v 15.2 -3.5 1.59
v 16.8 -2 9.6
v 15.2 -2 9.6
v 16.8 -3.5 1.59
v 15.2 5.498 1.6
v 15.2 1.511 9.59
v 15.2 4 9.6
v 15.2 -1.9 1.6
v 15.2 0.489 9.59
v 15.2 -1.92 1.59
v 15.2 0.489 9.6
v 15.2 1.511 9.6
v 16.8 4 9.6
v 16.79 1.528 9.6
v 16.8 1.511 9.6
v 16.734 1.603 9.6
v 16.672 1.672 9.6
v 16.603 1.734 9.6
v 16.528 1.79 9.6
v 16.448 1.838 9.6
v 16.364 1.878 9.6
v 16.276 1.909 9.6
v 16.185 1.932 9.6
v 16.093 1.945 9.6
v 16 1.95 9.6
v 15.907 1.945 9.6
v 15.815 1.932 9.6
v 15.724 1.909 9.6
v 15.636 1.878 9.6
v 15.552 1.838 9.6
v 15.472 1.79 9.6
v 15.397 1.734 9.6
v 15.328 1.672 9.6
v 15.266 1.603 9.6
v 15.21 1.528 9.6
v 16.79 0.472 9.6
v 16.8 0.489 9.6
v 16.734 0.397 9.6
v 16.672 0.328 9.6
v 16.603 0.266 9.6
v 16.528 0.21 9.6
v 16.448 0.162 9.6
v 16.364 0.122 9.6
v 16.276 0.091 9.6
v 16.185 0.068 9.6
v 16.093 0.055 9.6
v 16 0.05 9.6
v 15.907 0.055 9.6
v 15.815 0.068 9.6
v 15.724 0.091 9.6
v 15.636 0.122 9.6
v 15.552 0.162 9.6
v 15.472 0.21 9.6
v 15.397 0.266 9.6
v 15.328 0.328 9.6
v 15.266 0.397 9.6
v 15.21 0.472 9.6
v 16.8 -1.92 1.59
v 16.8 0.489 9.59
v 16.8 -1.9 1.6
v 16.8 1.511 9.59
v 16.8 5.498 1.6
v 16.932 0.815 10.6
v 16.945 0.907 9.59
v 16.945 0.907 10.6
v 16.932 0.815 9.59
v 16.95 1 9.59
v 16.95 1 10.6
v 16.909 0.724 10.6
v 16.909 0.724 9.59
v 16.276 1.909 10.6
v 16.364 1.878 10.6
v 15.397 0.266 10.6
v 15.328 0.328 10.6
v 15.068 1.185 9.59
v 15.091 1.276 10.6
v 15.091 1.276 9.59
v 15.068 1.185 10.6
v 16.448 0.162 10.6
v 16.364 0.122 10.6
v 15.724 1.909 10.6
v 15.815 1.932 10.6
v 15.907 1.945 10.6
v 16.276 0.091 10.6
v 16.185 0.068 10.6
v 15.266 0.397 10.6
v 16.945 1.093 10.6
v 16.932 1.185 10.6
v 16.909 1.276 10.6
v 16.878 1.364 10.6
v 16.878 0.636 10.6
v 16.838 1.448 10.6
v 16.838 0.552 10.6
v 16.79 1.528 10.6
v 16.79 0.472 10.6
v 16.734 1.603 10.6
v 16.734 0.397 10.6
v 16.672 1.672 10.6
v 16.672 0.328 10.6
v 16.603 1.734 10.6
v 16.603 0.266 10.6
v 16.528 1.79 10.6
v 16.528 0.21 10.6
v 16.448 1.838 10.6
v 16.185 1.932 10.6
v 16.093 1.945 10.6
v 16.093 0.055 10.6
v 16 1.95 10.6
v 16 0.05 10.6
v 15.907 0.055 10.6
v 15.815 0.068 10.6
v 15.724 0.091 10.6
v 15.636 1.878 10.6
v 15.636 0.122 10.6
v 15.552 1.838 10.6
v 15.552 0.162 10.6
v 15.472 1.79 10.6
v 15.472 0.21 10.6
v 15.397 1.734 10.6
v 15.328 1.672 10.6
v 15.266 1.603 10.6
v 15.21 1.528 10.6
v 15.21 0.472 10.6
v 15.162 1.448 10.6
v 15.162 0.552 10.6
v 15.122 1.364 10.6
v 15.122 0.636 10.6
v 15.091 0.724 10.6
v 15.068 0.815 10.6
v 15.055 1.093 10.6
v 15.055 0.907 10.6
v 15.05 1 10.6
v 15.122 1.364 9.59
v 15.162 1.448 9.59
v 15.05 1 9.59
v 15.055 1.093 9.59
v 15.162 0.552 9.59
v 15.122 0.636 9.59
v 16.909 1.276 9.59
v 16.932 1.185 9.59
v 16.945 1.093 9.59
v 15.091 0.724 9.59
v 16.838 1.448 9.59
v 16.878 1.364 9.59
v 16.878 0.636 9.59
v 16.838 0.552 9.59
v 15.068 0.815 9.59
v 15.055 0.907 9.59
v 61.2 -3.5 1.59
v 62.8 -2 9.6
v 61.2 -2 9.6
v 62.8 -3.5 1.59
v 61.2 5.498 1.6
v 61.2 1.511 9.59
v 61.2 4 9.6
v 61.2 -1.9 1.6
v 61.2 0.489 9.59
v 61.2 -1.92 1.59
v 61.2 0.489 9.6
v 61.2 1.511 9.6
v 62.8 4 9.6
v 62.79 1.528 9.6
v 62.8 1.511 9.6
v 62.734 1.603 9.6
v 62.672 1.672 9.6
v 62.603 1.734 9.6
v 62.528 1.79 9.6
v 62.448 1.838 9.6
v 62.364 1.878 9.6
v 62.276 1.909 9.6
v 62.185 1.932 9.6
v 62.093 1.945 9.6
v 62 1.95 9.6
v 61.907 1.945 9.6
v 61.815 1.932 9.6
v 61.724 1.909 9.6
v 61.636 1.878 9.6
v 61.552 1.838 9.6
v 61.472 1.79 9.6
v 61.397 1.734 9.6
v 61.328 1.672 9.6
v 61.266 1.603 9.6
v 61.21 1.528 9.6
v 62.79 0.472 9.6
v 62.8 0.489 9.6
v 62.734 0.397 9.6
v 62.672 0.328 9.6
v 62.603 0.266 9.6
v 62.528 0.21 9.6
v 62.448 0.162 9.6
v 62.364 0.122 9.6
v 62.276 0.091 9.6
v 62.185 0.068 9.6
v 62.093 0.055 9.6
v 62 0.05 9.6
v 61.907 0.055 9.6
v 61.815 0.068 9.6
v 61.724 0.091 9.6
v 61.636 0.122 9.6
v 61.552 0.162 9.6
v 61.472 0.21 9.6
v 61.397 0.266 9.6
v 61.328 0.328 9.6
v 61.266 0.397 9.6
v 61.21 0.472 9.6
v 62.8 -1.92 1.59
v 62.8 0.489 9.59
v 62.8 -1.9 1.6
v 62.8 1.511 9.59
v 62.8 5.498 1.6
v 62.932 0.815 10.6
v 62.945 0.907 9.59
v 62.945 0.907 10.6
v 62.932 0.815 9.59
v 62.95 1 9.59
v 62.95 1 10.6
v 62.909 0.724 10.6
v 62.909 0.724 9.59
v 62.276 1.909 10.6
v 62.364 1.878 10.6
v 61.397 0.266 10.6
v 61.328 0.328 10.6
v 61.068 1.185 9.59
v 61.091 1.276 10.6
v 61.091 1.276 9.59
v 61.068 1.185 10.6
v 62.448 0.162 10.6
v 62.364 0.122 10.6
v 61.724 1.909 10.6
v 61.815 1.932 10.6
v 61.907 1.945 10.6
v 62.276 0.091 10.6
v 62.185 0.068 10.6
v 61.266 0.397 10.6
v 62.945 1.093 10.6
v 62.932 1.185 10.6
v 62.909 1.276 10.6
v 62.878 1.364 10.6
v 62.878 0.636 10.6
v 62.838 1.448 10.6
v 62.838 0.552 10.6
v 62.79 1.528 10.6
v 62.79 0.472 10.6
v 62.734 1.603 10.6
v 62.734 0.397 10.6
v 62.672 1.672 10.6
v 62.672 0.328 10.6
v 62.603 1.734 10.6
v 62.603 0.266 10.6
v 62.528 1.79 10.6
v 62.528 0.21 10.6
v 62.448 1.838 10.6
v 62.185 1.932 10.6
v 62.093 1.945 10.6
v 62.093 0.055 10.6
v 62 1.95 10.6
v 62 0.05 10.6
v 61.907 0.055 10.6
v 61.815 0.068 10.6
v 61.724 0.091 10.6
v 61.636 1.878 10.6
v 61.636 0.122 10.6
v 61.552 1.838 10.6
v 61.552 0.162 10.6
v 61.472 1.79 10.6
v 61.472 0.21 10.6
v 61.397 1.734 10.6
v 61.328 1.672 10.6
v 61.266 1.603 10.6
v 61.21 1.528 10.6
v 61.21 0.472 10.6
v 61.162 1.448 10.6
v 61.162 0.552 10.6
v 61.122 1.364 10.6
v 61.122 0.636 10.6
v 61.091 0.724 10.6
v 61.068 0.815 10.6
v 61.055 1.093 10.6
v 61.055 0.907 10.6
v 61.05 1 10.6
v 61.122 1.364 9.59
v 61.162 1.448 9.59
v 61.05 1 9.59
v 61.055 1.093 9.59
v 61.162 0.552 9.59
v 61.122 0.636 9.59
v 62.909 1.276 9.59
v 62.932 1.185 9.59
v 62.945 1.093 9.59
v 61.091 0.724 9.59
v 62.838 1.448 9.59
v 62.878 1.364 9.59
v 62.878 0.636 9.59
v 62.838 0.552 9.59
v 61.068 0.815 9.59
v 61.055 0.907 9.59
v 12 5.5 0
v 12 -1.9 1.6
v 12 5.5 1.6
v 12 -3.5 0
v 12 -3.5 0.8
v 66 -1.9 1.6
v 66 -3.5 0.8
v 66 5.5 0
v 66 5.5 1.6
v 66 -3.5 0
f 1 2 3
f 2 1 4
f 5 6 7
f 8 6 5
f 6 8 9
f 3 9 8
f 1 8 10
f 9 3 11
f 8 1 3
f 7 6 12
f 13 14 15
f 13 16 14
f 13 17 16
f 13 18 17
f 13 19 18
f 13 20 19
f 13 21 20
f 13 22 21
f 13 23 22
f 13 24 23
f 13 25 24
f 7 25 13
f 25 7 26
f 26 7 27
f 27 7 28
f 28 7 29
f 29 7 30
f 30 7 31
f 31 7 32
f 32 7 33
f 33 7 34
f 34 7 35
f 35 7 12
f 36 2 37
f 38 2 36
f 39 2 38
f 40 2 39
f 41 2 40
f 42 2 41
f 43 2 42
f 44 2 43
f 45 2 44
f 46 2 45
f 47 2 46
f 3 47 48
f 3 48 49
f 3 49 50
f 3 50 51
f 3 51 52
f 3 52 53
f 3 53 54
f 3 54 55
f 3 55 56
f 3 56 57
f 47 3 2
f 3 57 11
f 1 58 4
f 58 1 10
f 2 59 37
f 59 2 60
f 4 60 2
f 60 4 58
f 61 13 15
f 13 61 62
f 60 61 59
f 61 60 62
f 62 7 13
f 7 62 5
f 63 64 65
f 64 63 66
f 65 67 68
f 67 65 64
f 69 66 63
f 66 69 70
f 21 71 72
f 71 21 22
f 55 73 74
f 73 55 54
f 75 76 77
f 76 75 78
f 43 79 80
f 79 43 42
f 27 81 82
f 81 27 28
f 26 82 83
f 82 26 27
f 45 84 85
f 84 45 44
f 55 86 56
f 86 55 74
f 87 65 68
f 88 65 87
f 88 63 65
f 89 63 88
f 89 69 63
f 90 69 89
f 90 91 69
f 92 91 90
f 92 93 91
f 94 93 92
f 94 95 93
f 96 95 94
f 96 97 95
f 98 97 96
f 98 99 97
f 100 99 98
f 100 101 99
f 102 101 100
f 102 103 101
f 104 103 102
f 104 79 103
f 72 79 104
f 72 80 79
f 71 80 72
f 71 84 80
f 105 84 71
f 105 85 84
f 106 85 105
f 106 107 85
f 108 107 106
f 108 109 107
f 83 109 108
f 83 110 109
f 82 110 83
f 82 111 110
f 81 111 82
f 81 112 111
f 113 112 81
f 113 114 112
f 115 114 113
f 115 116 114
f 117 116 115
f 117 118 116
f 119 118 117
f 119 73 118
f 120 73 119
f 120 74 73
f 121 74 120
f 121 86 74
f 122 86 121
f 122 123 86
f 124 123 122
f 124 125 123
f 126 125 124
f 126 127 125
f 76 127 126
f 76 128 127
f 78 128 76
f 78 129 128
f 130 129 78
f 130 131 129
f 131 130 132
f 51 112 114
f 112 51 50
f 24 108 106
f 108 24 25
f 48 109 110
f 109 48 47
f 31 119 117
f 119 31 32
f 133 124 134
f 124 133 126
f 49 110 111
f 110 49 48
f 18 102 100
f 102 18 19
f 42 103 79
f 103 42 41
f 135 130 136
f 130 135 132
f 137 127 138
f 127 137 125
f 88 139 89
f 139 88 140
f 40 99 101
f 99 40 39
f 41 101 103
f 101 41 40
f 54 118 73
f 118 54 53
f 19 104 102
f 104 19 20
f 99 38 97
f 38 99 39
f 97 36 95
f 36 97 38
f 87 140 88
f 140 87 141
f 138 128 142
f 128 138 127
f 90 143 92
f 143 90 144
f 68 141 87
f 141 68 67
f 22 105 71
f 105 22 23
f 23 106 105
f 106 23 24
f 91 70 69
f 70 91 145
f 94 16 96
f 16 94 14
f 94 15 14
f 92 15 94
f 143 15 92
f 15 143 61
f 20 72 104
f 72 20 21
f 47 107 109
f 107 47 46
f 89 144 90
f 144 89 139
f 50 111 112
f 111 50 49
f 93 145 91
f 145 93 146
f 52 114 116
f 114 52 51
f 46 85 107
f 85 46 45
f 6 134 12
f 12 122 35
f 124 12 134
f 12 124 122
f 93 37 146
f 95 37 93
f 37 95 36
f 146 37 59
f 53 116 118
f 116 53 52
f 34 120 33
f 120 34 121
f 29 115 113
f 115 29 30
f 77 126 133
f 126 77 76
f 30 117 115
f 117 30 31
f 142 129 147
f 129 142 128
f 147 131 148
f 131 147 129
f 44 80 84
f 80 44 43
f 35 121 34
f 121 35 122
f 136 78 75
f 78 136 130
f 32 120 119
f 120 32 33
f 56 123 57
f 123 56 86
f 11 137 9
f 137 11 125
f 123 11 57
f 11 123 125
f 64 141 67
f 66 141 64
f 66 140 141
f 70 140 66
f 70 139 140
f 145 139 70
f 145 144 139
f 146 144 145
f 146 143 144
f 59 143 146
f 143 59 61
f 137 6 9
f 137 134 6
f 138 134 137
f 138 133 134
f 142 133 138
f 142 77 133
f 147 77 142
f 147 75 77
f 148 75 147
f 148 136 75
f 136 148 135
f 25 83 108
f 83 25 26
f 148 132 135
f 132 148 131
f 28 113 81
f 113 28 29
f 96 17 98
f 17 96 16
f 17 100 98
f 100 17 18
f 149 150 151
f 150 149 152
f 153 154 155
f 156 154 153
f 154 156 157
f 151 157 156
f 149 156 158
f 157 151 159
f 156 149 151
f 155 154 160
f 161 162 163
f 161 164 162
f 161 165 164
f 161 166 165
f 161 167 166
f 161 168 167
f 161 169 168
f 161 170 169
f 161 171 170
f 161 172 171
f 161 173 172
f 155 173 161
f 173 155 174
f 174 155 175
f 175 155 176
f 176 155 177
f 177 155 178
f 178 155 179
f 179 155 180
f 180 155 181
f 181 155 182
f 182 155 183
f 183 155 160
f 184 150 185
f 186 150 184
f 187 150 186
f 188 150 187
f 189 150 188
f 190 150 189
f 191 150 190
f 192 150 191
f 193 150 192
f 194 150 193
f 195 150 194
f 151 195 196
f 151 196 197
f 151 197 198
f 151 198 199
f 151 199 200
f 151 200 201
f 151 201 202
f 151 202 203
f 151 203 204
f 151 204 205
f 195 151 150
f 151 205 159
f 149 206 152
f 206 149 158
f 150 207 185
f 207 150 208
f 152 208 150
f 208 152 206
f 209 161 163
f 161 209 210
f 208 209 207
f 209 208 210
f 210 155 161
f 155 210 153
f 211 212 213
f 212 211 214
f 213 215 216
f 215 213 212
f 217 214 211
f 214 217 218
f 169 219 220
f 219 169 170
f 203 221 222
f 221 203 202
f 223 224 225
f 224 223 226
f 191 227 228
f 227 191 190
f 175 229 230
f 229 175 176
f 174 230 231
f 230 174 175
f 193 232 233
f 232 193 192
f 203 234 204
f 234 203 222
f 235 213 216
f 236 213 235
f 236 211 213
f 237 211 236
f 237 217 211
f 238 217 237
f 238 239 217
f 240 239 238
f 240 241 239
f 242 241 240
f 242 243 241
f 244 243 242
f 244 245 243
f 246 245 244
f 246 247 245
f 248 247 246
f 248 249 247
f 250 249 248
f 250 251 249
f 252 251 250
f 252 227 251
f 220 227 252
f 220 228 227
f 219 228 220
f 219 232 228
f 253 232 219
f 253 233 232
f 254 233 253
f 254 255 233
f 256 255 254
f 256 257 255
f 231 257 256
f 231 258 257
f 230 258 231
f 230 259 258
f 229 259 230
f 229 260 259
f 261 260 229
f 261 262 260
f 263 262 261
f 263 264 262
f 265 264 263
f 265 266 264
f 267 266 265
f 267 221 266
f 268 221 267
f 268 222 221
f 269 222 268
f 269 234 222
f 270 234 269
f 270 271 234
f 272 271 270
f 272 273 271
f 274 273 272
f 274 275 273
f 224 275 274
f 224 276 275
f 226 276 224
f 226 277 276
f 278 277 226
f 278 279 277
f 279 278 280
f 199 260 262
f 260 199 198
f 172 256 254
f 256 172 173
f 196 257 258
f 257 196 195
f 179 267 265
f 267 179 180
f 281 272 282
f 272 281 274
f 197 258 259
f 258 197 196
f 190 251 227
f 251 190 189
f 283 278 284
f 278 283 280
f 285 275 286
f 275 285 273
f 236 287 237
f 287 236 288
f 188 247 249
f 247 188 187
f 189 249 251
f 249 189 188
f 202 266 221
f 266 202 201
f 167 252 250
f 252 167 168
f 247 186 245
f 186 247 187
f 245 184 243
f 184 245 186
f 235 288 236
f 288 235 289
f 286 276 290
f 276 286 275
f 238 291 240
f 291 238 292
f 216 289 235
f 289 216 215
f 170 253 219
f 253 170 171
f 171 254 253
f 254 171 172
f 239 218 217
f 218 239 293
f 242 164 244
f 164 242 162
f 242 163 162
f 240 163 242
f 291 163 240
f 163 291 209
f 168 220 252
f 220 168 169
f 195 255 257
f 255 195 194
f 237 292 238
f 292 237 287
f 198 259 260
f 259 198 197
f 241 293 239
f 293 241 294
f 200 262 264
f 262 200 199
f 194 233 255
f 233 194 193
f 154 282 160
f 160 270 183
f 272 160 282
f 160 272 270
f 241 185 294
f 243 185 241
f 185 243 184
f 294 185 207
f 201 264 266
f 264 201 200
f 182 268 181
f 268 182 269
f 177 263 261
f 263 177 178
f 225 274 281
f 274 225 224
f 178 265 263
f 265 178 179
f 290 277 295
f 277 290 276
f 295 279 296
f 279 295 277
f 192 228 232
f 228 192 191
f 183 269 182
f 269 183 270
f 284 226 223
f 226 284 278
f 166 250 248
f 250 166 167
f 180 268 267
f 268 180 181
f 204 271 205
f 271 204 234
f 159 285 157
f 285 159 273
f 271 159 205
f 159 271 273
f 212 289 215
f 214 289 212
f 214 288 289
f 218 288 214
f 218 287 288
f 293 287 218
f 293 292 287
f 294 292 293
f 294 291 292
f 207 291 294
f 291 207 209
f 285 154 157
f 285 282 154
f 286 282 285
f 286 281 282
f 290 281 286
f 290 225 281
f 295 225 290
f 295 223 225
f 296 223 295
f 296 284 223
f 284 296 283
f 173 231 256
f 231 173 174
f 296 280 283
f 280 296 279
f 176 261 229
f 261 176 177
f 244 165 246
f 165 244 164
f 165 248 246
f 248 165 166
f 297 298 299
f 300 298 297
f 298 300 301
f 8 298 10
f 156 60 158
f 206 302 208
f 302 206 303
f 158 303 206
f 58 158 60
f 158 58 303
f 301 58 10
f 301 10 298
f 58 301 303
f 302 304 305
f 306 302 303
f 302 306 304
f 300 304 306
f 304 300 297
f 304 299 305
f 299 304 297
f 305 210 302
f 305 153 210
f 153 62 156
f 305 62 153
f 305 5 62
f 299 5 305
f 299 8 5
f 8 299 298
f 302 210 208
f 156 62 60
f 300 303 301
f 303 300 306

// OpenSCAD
// Racer v0.1 "nordic" - space hi-tech demo racer on the v0.4 internals (N20 cradles + clamps, PCB, 32x10 wheels)
// Design: calm convex hull plan, long sloped nose, flush glass canopy over the ESP32 ("pilot"),
// one copper character line, front and rear light bars, rear thrusters, floating wing.
// Driving direction is +y: the axle sits at the rear, the nose tip glides on the floor (slight rake).
// Coordinates = PCB-local: x = width, y = length (y = 0 is the narrow PCB edge = rear), z = 0 is tub bottom.

part = "wing"; // [assembly, tub, lid, lid_accent, canopy, wing, motor_clamp, test_motor]
$fn = 64;

/* [PCB] */
pcb_w = 78;
pcb_l = 56;
pcb_t = 1.6;
pcb_clear = 0.3;
pcb_gap = 0.3;                       // PCB above the motor clamps
pcb_holes = [[9.14, 3.14], [68.86, 3.14], [3.95, 44.56], [74.05, 44.56]];
lid_screw_holes = [0, 1];            // indices in pcb_holes clamped by the lid
switch_slot = [[63.65, 38.65], [66.65, 45.65]];
switch_holes = [[65.15, 34.7], [65.15, 49.6]];   // switch mounting holes (pcb-dimensions.DXF)
switch_hole_d = 2;

/* [Components (estimates, measure!)] */
drv_center = [37.93, 15.5];
drv_pins = 6;
drv_w = 18;
drv_len = drv_pins * 2.54 + (22.5 - 8 * 2.54);
drv_body = [drv_center - [drv_len / 2, drv_w / 2], drv_center + [drv_len / 2, drv_w / 2]];
drv_h = 9;
esp_body = [[28.1, 31.7], [48.4, 49.5]];
esp_h = 5;
battery = [50, 30, 8];
battery_y0 = 60;                     // ahead of the PCB, so the axle can sit low

/* [Drive] */
wheel_d = 34;
wheel_w = 10;
wheel_gap = 1;
ground_clearance = 7.0;                // under the axle; the nose tip touches the floor
axle_y = 19;
// N20 (Pololu micro metal gearmotor): gearbox 12 x 10 x 9, can d12 with flats at 10, 24-26 mm long
gearbox_l = 9;
gb_w = 12;
gb_h = 10;
motor_d = 12;
motor_l = 15;
motor_term_l = 3;
shaft_d = 3;
shaft_l = 10;
shaft_boss_d = 5;
motor_fit = 0.25;                    // per side, FDM slide fit
drv_clear = 0.3;

/* [Motor clamp] */
clamp_squeeze = 0.2;
clamp_wall = 1.6;
clamp_top_t = 1.2;
clamp_screw_x = 12;
clamp_screw_margin = 1;              // motor slot edge to screw hole edge
clamp_boss_d = 4.4;
clamp_head_d = 4.2;
clamp_head_recess = 1.6;

/* [Chassis] */
H = 28;                              // deck height (lid top)
wall = 1.6;
floor_t = 1.2;
lid_t = 1.2;
iw_t = 1.4;
gb_gap = 0.3;
standoff_d = 5;
pilot_d = 1.7;
screw_clear_d = 2.4;
lid_lip_h = 2;
lid_lip_t = 1.2;
lid_fit = 0.2;
snap_x = [25, 53];                   // snaps on the front wall
snap_r = 0.8;
strap_w = 11;
strap_slot = 2;
strap_x = [33, 45];
floor_slots = [[[14, 7.5], [64, 12]], [[31, 16], [47, 28]]];
slot_w = 2.5;
slot_pitch = 5;

/* [Body shape] */
rear_r = 8;
rear_ext = 3;                        // tail behind the PCB, room for the wheels
full_width_y = 44;                   // body keeps the wheel-pod width up to here, then tapers
nose_l = 40;
tip_r = 10;
tip_h = 6;

/* [Canopy] */
canopy_h = 8;                        // above the deck
canopy_peak_dy = -3;                 // peak sits behind the window centre

/* [Wing] */
wing_gap = 8;                        // wing underside above the deck
wing_t = 1.6;
wing_chord = 9;
wing_y0 = -5.5;
wing_x = [16, 62];                   // fin centres
wing_span_ext = 4;                   // plate beyond the fins
fin_t = 1.6;
pin_d = 2;
pin_h = 1;

/* [Design] */
edge_c = 1.0;
layer_h = 0.2;
line_h = 1.0;
line_d = 0.4;
arch_r = 1.5;
accent_d = 0.6;
lightbar_w = 1.2;
front_bar_x = [22, 56];
rear_bar_x = [20, 58];
lightbar_inset = 1.5;
thruster_d = 9;
thruster_dx = 12;
thruster_ring = 1.2;
thruster_depth = 0.8;

/* [Colours] */
palette = "nordic_arctic"; // [nordic_arctic, nordic_night]
two_tone_preview = true;
// [tub lower, tub upper, character line, lid + clamps, glass + lights, wing], each [filament, preview hex]
pal = palette == "nordic_night"
    ? [["dark gray", "#3C3F41"], ["dark gray", "#2E3032"], ["copper", "#B87333"], ["dark gray", "#2E3032"],
       ["transparent", "#E8F0F2"], ["copper", "#B87333"]]
    : [["dark gray", "#3C3F41"], ["silver", "#C4C7CA"], ["copper", "#B87333"], ["silver", "#C4C7CA"],
       ["transparent", "#E8F0F2"], ["dark gray", "#3C3F41"]];

// ---------- derived ----------
axle_z = wheel_d / 2 - ground_clearance;
clamp_top_z = axle_z + gb_h / 2 - clamp_squeeze + clamp_top_t;
pcb_z = clamp_top_z + pcb_gap;
tub_h = H - lid_t;
motor_total = gearbox_l + motor_l + motor_term_l;
mount_l = gearbox_l + motor_l + motor_fit;
clamp_screw_y = gb_w / 2 + motor_fit + clamp_screw_margin + screw_clear_d / 2;
gf_x = min(drv_body[0][0] - drv_clear - motor_total,
           pcb_w - (drv_body[1][0] + drv_clear + motor_total));
iw_x1 = gf_x - gb_gap;
iw_x0 = iw_x1 - iw_t;
wheel_x0 = iw_x0 - wheel_gap - wheel_w;
ow_x1 = wheel_x0 - wheel_gap;
ow_x0 = ow_x1 - wall;
cx = pcb_w / 2;
width = pcb_w - 2 * ow_x0;
in_y0 = -pcb_clear - rear_ext;
in_y1 = max(pcb_l + pcb_clear, battery_y0 + battery[1] + 1 + strap_slot + 0.5);
rear_y = in_y0 - wall;
deck_y1 = in_y1 + wall;
y_tip = deck_y1 + nose_l;
battery_pos = [cx - battery[0] / 2, battery_y0];
well_y0 = in_y0;
well_y1 = axle_y + wheel_d / 2 + wheel_gap;
arch_half = sqrt(pow(wheel_d / 2, 2) - pow(axle_z - floor_t, 2)) + wheel_gap;
arch_half_lid = sqrt(pow(wheel_d / 2, 2) - pow(tub_h - axle_z, 2)) + wheel_gap;
n_chamf = round(edge_c / layer_h);
line_z0 = round((axle_z - line_h / 2) / layer_h) * layer_h;
rake = atan(ground_clearance / (y_tip - axle_y));
esp_win = [esp_body[0] - [1, 1], esp_body[1] + [1, 1]];
esp_win_c = (esp_win[0] + esp_win[1]) / 2;

echo(str("Racer ", width, " x ", y_tip - rear_y, " x ", H, " mm (deck), canopy top ", H + canopy_h,
         ", wing top ", H + wing_gap + wing_t, " mm"));
echo(str("PCB bottom z = ", pcb_z, ", rake ", rake, " deg (nose tip glides), nose slope ", atan((H - tip_h) / nose_l), " deg"));
echo(str("Colours tub: 0-", line_z0, " ", pal[0][0], " | ", line_z0, "-", line_z0 + line_h, " ", pal[2][0],
         " | ", line_z0 + line_h, "-top ", pal[1][0], "; lid + clamps ", pal[3][0], "; canopy + lights ", pal[4][0],
         "; wing ", pal[5][0]));

assert(well_y1 + iw_t <= 41 - pcb_clear, "wheel well hits wide PCB part");
assert(gf_x - shaft_l > ow_x1, "motor shaft hits outer wall");
assert(pcb_z + pcb_t + esp_h <= tub_h, "ESP32 hits lid");
assert(min(strap_x) - strap_w / 2 > gf_x + mount_l && max(strap_x) + strap_w / 2 < pcb_w - gf_x - mount_l,
       "strap slot hits motor cradle");
assert(battery_y0 - 1 - strap_slot >= pcb_l + pcb_clear || floor_t + battery[2] < pcb_z - drv_h,
       "battery hits parts under the PCB");
assert(axle_z + wheel_d / 2 <= H, "wheel sticks out above the deck");
assert(battery_pos[0] > 6.5 + 1 && battery_pos[0] + battery[0] < pcb_w - 6.5 - 1, "battery hits rear standoffs");
assert(full_width_y >= well_y1 + iw_t, "wheel pods taper too early");
for (i = lid_screw_holes, x = wing_x)
    assert(abs(pcb_holes[i][0] - x) > fin_t / 2 + pin_d + 3, "wing fin blocks a lid screw");

// ---------- 2D helpers ----------
module mirror_x(m) {
    if (m == 0) children();
    else translate([pcb_w, 0, 0]) mirror([1, 0, 0]) children();
}

module rrect(r0, r1, r) translate([r0[0] + r, r0[1] + r]) offset(r = r) square([r1[0] - r0[0] - 2 * r, r1[1] - r0[1] - 2 * r]);

module slot2d(p0, p1, w) hull() { translate(p0) circle(d = w); translate(p1) circle(d = w); }

module switch_win2d() {
    translate(switch_slot[0]) square(switch_slot[1] - switch_slot[0]);
    for (p = switch_holes) translate(p) circle(d = switch_hole_d);
}

module pcb_outline()
    polygon([[6, 0], [72, 0], [72, 41], [78, 41], [78, 48], [70, 56],
             [8, 56], [0, 48], [0, 41], [6, 41]]);

// convex plan: full width over the wheel pods, straight taper into a round nose tip
module plan() hull() {
    for (x = [ow_x0 + rear_r, pcb_w - ow_x0 - rear_r]) translate([x, rear_y + rear_r]) circle(r = rear_r);
    translate([ow_x0, full_width_y - 0.01]) square([width, 0.01]);
    translate([cx, y_tip - tip_r]) circle(r = tip_r);
}

module deck_plan() intersection() { plan(); translate([-50, rear_y - 1]) square([200, deck_y1 - rear_y + 1]); }

module outline_inner()
    intersection() {
        offset(delta = -wall) plan();
        translate([-50, in_y0]) square([200, in_y1 - in_y0]);
    }

module well_rect() translate([ow_x1, well_y0]) square([iw_x0 - ow_x1, well_y1 - well_y0]);

module arch_opening(half = arch_half) rrect([ow_x1, axle_y - half], [iw_x0, axle_y + half], arch_r);

module floor_slots2d()
    for (r = floor_slots) {
        n = floor((r[1][0] - r[0][0] - slot_w) / slot_pitch) + 1;
        ox = r[0][0] + (r[1][0] - r[0][0] - (n - 1) * slot_pitch) / 2;
        for (i = [0 : n - 1])
            slot2d([ox + i * slot_pitch, r[0][1] + slot_w / 2], [ox + i * slot_pitch, r[1][1] - slot_w / 2], slot_w);
    }

module accents2d() {
    slot2d([front_bar_x[0], deck_y1 - wall - lightbar_inset], [front_bar_x[1], deck_y1 - wall - lightbar_inset], lightbar_w);
    slot2d([rear_bar_x[0], in_y0 + lightbar_inset], [rear_bar_x[1], in_y0 + lightbar_inset], lightbar_w);
}

module esp_window2d(grow = 0) rrect(esp_win[0] - [grow, grow], esp_win[1] + [grow, grow], 2 + grow);

// ---------- 3D helpers ----------
module yz_extrude(x0, w) translate([x0, 0, 0]) rotate([90, 0, 90]) linear_extrude(w) children();

module chamfered_extrude(h, bottom = true) {
    for (i = [0 : n_chamf - 1])
        translate([0, 0, bottom ? i * layer_h : h - (i + 1) * layer_h])
            linear_extrude(layer_h + 0.01) offset(delta = -(edge_c - (i + 0.5) * layer_h)) children();
    translate([0, 0, bottom ? edge_c : 0]) linear_extrude(h - edge_c + 0.01) children();
}

// ---------- motor mount (same as v0.4) ----------
module motor_cavity() {
    w = gb_w + 2 * motor_fit;
    translate([0, axle_y, axle_z]) {
        yz_extrude(iw_x1 - 0.01, gf_x - iw_x1 + gearbox_l + motor_fit + 0.01)
            translate([-w / 2, -gb_h / 2]) square([w, gb_h - clamp_squeeze]);
        yz_extrude(gf_x + gearbox_l, motor_l + motor_term_l + 2) intersection() {
            circle(d = motor_d + 2 * motor_fit);
            translate([-w / 2, -gb_h / 2]) square([w, gb_h - clamp_squeeze]);
        }
    }
}

module clamp_screws(z, h, d) {
    for (s = [-1, 1]) translate([gf_x + clamp_screw_x, axle_y + s * clamp_screw_y, z]) cylinder(d = d, h = h);
}

module clamp_ears(z, h) {
    cw = gb_w + 2 * motor_fit;
    for (s = [-1, 1]) hull() {
        translate([gf_x + clamp_screw_x, axle_y + s * clamp_screw_y, z]) cylinder(d = clamp_boss_d, h = h);
        translate([gf_x + clamp_screw_x - clamp_boss_d / 2, axle_y + (s < 0 ? -cw / 2 - clamp_wall : cw / 2), z])
            cube([clamp_boss_d, clamp_wall, h]);
    }
}

module motor_cradle() {
    x0 = iw_x1 - 0.01;
    l = gf_x + mount_l - x0;
    cw = gb_w + 2 * motor_fit;
    difference() {
        union() {
            translate([x0, axle_y - cw / 2 - clamp_wall, axle_z - gb_h / 2 - 1.2])
                cube([l, cw + 2 * clamp_wall, gb_h / 2 + 1.2]);
            for (s = [-1, 1]) translate([x0, axle_y + (s < 0 ? -cw / 2 - clamp_wall : cw / 2), 0])
                cube([l, clamp_wall, axle_z]);
            for (rx = [x0, gf_x + gearbox_l - 1, gf_x + mount_l - clamp_wall])
                translate([rx, axle_y - cw / 2, 0]) cube([clamp_wall, cw, axle_z]);
            clamp_ears(0, axle_z);
        }
        motor_cavity();
        clamp_screws(axle_z - 8, 9, pilot_d);
    }
}

module motor_clamp() {
    x0 = iw_x1 + 0.2;
    cw = gb_w + 2 * motor_fit;
    difference() {
        union() {
            translate([x0, axle_y - cw / 2 - clamp_wall, axle_z])
                cube([gf_x + mount_l - x0, cw + 2 * clamp_wall, clamp_top_z - axle_z]);
            clamp_ears(axle_z, clamp_top_z - axle_z);
        }
        motor_cavity();
        clamp_screws(axle_z - 1, clamp_top_z - axle_z + 2, screw_clear_d);
        clamp_screws(clamp_top_z - clamp_head_recess, clamp_head_recess + 1, clamp_head_d);
    }
}

// ---------- tub ----------
module well_boxes()
    intersection() {
        chamfered_extrude(tub_h, true) plan();
        for (m = [0, 1]) mirror_x(m) linear_extrude(tub_h) difference() {
            offset(delta = iw_t) well_rect();
            well_rect();
        }
    }

module character_line()
    translate([0, 0, line_z0]) linear_extrude(line_h) difference() {
        offset(delta = 1) plan();
        offset(delta = -line_d) plan();
    }

// solid nose (slicer infill keeps it light), top slopes from the deck to the glide tip
module nose_cap() intersection() {
    translate([0, 0, tub_h - 0.01]) linear_extrude(H - tub_h + 0.01) plan();
    translate([-50, deck_y1 - 0.01, 0]) cube([200, 200, H + 1]);
}

module nose_profile_cut()
    yz_extrude(-50, 200)
        polygon([[deck_y1, H], [y_tip, tip_h], [y_tip + 20, tip_h], [y_tip + 20, H + 20], [deck_y1, H + 20]]);

module thrusters()
    for (s = [-1, 1]) translate([cx + s * thruster_dx, rear_y - 1, axle_z]) rotate([-90, 0, 0]) difference() {
        cylinder(d = thruster_d, h = 1 + thruster_depth);
        translate([0, 0, -1]) cylinder(d = thruster_d - 2 * thruster_ring, h = 3 + thruster_depth);
    }

module tub() {
    difference() {
        union() {
            difference() {
                union() {
                    difference() {
                        chamfered_extrude(tub_h, true) plan();
                        translate([0, 0, floor_t]) linear_extrude(tub_h) outline_inner();
                    }
                    well_boxes();
                    nose_cap();
                }
                character_line();
            }
            for (m = [0, 1]) mirror_x(m) motor_cradle();
            for (p = pcb_holes) translate([p[0], p[1], 0]) cylinder(d = standoff_d, h = pcb_z);
        }
        nose_profile_cut();
        thrusters();
        for (m = [0, 1]) mirror_x(m) {
            translate([0, 0, -1]) linear_extrude(floor_t + 2) arch_opening();
            // open-top shaft slot: motor with wheel fitted drops straight in
            hull() for (z = [axle_z, tub_h + 1])
                translate([iw_x0 - 1, axle_y, z]) rotate([0, 90, 0]) cylinder(d = shaft_boss_d, h = iw_t + 2);
        }
        for (sx = snap_x) translate([sx, in_y1, tub_h - lid_lip_h / 2]) sphere(r = snap_r);
        for (p = pcb_holes) translate([p[0], p[1], pcb_z - 8]) cylinder(d = pilot_d, h = 9);
        for (sx = strap_x, sy = [battery_pos[1] - 1 - strap_slot, battery_pos[1] + battery[1] + 1])
            translate([sx - strap_w / 2, sy, -1]) cube([strap_w, strap_slot, floor_t + 2]);
        translate([0, 0, -1]) linear_extrude(floor_t + 2) floor_slots2d();
    }
}

// ---------- lid ----------
module lid() {
    difference() {
        union() {
            translate([0, 0, tub_h]) chamfered_extrude(lid_t, false) deck_plan();
            translate([0, 0, tub_h - lid_lip_h]) linear_extrude(lid_lip_h + 0.01) difference() {
                offset(delta = -lid_fit) outline_inner();
                offset(delta = -lid_fit - lid_lip_t) outline_inner();
            }
            for (i = lid_screw_holes) translate([pcb_holes[i][0], pcb_holes[i][1], pcb_z + pcb_t])
                cylinder(d = standoff_d, h = tub_h - pcb_z - pcb_t + 0.01);
            for (sx = snap_x) translate([sx, in_y1 - lid_fit, tub_h - lid_lip_h / 2]) sphere(r = snap_r - 0.2);
        }
        for (m = [0, 1]) mirror_x(m) {
            translate([0, 0, tub_h - 1]) linear_extrude(lid_t + 2) arch_opening(arch_half_lid);
            translate([ow_x1 - 1, well_y0 - 2, tub_h - lid_lip_h - 1])
                cube([iw_x1 + lid_fit - ow_x1 + 1, well_y1 + iw_t + lid_fit - well_y0 + 2, lid_lip_h + 1]);
        }
        for (i = lid_screw_holes) translate([pcb_holes[i][0], pcb_holes[i][1], pcb_z])
            cylinder(d = screw_clear_d, h = H);
        translate([0, 0, tub_h - 1]) linear_extrude(lid_t + 2) switch_win2d();
        // 45 degree countersunk window: the canopy sits flush and the lid prints top-down without support
        hull() {
            translate([0, 0, tub_h - 1]) linear_extrude(1.01) esp_window2d();
            translate([0, 0, H]) linear_extrude(0.01) esp_window2d(lid_t);
        }
        for (x = wing_x) translate([x, wing_y0 + wing_chord / 2, tub_h - 1]) cylinder(d = pin_d + 0.2, h = lid_t + 2);
        translate([0, 0, H - accent_d]) linear_extrude(accent_d + 1) accents2d();
    }
}

module lid_accent() translate([0, 0, H - accent_d]) linear_extrude(accent_d) accents2d();

// ---------- canopy (transparent, print solid on its base) ----------
module canopy() {
    g = lid_t - lid_fit;
    hull() {
        translate([0, 0, tub_h + lid_fit]) linear_extrude(0.01) esp_window2d();
        translate([0, 0, H]) linear_extrude(0.01) esp_window2d(g);
        translate([esp_win_c[0], esp_win_c[1] + canopy_peak_dy, H + canopy_h - 3])
            scale([(esp_win[1][0] - esp_win[0][0]) / 2 - 3, (esp_win[1][1] - esp_win[0][1]) / 2 - 1, 3]) sphere(r = 1);
    }
}

// ---------- wing ----------
module wing() {
    x0 = wing_x[0] - wing_span_ext;
    x1 = wing_x[1] + wing_span_ext;
    z1 = H + wing_gap;
    // plate with a chamfered leading edge (front = +y)
    yz_extrude(x0, x1 - x0)
        polygon([[wing_y0, z1], [wing_y0 + wing_chord - wing_t, z1], [wing_y0 + wing_chord, z1 + wing_t / 2],
                 [wing_y0 + wing_chord, z1 + wing_t], [wing_y0, z1 + wing_t]]);
    for (x = wing_x) {
        yz_extrude(x - fin_t / 2, fin_t)
            polygon([[wing_y0 + 1.5, H], [wing_y0 + wing_chord - 1.5, H], [wing_y0 + wing_chord, z1 + 0.01],
                     [wing_y0, z1 + 0.01]]);
        translate([x, wing_y0 + wing_chord / 2, H - pin_h]) cylinder(d = pin_d - 0.1, h = pin_h + 0.01);
    }
}

// ---------- ghost components ----------
module ghosts() {
    for (m = [0, 1]) mirror_x(m) {
        color("black", 0.6) translate([wheel_x0, axle_y, axle_z]) rotate([0, 90, 0]) cylinder(d = wheel_d, h = wheel_w);
        color("silver", 0.6) translate([0, axle_y, axle_z]) {
            yz_extrude(gf_x, gearbox_l) square([gb_w, gb_h], center = true);
            yz_extrude(gf_x + gearbox_l, motor_l) intersection() {
                circle(d = motor_d);
                square([gb_w, gb_h], center = true);
            }
        }
        color("silver", 0.6) translate([gf_x - shaft_l, axle_y, axle_z]) rotate([0, 90, 0]) cylinder(d = shaft_d, h = shaft_l);
    }
    color("green", 0.5) translate([0, 0, pcb_z]) linear_extrude(pcb_t) pcb_outline();
    color("purple", 0.6) translate([drv_body[0][0], drv_body[0][1], pcb_z - drv_h])
        cube([drv_body[1][0] - drv_body[0][0], drv_body[1][1] - drv_body[0][1], drv_h]);
    color("blue", 0.6) translate([esp_body[0][0], esp_body[0][1], pcb_z + pcb_t])
        cube([esp_body[1][0] - esp_body[0][0], esp_body[1][1] - esp_body[0][1], esp_h]);
    color("orange", 0.6) translate([battery_pos[0], battery_pos[1], floor_t]) cube(battery);
}

module tub_zone(z0, z1) intersection() { render() tub(); translate([-50, -100, z0]) cube([200, 300, z1 - z0]); }

module tub_coloured() {
    if (two_tone_preview) {
        color(pal[0][1]) render() tub_zone(-1, line_z0);
        color(pal[2][1]) render() tub_zone(line_z0, line_z0 + line_h);
        color(pal[1][1]) render() tub_zone(line_z0 + line_h, H + 1);
    } else color(pal[1][1]) tub();
}

module assembly() {
    tub_coloured();
    color(pal[3][1]) lid();
    color(pal[3][1]) for (m = [0, 1]) mirror_x(m) motor_clamp();
    color(pal[4][1], 0.5) { lid_accent(); canopy(); }
    color(pal[5][1]) wing();
    ghosts();
}

// shown level; on the floor the racer rests on the wheels and the nose tip (rake)
// F6 (CGAL) in OpenSCAD 2021.01 drops all colours; use F5 to see them
if (part == "assembly") assembly();
else if (part == "tub") { if ($preview) tub_coloured(); else tub(); }
else if (part == "lid") color(pal[3][1]) translate([0, 0, H]) rotate([180, 0, 0]) lid();
else if (part == "lid_accent") color(pal[4][1]) translate([0, 0, H]) rotate([180, 0, 0]) lid_accent();
else if (part == "canopy") color(pal[4][1], 0.7) translate([0, 0, -tub_h - lid_fit]) canopy();
else if (part == "wing") color(pal[5][1]) translate([0, 0, H + wing_gap + wing_t]) rotate([180, 0, 0]) wing();
else if (part == "motor_clamp") color(pal[3][1]) translate([0, 0, clamp_top_z]) rotate([180, 0, 0]) translate([-gf_x, -axle_y, 0]) motor_clamp();
else if (part == "test_motor")
    intersection() { tub(); translate([iw_x0 - 1, axle_y - clamp_screw_y - clamp_boss_d, -1]) cube([mount_l + 4, 2 * (clamp_screw_y + clamp_boss_d), axle_z + 1]); }
